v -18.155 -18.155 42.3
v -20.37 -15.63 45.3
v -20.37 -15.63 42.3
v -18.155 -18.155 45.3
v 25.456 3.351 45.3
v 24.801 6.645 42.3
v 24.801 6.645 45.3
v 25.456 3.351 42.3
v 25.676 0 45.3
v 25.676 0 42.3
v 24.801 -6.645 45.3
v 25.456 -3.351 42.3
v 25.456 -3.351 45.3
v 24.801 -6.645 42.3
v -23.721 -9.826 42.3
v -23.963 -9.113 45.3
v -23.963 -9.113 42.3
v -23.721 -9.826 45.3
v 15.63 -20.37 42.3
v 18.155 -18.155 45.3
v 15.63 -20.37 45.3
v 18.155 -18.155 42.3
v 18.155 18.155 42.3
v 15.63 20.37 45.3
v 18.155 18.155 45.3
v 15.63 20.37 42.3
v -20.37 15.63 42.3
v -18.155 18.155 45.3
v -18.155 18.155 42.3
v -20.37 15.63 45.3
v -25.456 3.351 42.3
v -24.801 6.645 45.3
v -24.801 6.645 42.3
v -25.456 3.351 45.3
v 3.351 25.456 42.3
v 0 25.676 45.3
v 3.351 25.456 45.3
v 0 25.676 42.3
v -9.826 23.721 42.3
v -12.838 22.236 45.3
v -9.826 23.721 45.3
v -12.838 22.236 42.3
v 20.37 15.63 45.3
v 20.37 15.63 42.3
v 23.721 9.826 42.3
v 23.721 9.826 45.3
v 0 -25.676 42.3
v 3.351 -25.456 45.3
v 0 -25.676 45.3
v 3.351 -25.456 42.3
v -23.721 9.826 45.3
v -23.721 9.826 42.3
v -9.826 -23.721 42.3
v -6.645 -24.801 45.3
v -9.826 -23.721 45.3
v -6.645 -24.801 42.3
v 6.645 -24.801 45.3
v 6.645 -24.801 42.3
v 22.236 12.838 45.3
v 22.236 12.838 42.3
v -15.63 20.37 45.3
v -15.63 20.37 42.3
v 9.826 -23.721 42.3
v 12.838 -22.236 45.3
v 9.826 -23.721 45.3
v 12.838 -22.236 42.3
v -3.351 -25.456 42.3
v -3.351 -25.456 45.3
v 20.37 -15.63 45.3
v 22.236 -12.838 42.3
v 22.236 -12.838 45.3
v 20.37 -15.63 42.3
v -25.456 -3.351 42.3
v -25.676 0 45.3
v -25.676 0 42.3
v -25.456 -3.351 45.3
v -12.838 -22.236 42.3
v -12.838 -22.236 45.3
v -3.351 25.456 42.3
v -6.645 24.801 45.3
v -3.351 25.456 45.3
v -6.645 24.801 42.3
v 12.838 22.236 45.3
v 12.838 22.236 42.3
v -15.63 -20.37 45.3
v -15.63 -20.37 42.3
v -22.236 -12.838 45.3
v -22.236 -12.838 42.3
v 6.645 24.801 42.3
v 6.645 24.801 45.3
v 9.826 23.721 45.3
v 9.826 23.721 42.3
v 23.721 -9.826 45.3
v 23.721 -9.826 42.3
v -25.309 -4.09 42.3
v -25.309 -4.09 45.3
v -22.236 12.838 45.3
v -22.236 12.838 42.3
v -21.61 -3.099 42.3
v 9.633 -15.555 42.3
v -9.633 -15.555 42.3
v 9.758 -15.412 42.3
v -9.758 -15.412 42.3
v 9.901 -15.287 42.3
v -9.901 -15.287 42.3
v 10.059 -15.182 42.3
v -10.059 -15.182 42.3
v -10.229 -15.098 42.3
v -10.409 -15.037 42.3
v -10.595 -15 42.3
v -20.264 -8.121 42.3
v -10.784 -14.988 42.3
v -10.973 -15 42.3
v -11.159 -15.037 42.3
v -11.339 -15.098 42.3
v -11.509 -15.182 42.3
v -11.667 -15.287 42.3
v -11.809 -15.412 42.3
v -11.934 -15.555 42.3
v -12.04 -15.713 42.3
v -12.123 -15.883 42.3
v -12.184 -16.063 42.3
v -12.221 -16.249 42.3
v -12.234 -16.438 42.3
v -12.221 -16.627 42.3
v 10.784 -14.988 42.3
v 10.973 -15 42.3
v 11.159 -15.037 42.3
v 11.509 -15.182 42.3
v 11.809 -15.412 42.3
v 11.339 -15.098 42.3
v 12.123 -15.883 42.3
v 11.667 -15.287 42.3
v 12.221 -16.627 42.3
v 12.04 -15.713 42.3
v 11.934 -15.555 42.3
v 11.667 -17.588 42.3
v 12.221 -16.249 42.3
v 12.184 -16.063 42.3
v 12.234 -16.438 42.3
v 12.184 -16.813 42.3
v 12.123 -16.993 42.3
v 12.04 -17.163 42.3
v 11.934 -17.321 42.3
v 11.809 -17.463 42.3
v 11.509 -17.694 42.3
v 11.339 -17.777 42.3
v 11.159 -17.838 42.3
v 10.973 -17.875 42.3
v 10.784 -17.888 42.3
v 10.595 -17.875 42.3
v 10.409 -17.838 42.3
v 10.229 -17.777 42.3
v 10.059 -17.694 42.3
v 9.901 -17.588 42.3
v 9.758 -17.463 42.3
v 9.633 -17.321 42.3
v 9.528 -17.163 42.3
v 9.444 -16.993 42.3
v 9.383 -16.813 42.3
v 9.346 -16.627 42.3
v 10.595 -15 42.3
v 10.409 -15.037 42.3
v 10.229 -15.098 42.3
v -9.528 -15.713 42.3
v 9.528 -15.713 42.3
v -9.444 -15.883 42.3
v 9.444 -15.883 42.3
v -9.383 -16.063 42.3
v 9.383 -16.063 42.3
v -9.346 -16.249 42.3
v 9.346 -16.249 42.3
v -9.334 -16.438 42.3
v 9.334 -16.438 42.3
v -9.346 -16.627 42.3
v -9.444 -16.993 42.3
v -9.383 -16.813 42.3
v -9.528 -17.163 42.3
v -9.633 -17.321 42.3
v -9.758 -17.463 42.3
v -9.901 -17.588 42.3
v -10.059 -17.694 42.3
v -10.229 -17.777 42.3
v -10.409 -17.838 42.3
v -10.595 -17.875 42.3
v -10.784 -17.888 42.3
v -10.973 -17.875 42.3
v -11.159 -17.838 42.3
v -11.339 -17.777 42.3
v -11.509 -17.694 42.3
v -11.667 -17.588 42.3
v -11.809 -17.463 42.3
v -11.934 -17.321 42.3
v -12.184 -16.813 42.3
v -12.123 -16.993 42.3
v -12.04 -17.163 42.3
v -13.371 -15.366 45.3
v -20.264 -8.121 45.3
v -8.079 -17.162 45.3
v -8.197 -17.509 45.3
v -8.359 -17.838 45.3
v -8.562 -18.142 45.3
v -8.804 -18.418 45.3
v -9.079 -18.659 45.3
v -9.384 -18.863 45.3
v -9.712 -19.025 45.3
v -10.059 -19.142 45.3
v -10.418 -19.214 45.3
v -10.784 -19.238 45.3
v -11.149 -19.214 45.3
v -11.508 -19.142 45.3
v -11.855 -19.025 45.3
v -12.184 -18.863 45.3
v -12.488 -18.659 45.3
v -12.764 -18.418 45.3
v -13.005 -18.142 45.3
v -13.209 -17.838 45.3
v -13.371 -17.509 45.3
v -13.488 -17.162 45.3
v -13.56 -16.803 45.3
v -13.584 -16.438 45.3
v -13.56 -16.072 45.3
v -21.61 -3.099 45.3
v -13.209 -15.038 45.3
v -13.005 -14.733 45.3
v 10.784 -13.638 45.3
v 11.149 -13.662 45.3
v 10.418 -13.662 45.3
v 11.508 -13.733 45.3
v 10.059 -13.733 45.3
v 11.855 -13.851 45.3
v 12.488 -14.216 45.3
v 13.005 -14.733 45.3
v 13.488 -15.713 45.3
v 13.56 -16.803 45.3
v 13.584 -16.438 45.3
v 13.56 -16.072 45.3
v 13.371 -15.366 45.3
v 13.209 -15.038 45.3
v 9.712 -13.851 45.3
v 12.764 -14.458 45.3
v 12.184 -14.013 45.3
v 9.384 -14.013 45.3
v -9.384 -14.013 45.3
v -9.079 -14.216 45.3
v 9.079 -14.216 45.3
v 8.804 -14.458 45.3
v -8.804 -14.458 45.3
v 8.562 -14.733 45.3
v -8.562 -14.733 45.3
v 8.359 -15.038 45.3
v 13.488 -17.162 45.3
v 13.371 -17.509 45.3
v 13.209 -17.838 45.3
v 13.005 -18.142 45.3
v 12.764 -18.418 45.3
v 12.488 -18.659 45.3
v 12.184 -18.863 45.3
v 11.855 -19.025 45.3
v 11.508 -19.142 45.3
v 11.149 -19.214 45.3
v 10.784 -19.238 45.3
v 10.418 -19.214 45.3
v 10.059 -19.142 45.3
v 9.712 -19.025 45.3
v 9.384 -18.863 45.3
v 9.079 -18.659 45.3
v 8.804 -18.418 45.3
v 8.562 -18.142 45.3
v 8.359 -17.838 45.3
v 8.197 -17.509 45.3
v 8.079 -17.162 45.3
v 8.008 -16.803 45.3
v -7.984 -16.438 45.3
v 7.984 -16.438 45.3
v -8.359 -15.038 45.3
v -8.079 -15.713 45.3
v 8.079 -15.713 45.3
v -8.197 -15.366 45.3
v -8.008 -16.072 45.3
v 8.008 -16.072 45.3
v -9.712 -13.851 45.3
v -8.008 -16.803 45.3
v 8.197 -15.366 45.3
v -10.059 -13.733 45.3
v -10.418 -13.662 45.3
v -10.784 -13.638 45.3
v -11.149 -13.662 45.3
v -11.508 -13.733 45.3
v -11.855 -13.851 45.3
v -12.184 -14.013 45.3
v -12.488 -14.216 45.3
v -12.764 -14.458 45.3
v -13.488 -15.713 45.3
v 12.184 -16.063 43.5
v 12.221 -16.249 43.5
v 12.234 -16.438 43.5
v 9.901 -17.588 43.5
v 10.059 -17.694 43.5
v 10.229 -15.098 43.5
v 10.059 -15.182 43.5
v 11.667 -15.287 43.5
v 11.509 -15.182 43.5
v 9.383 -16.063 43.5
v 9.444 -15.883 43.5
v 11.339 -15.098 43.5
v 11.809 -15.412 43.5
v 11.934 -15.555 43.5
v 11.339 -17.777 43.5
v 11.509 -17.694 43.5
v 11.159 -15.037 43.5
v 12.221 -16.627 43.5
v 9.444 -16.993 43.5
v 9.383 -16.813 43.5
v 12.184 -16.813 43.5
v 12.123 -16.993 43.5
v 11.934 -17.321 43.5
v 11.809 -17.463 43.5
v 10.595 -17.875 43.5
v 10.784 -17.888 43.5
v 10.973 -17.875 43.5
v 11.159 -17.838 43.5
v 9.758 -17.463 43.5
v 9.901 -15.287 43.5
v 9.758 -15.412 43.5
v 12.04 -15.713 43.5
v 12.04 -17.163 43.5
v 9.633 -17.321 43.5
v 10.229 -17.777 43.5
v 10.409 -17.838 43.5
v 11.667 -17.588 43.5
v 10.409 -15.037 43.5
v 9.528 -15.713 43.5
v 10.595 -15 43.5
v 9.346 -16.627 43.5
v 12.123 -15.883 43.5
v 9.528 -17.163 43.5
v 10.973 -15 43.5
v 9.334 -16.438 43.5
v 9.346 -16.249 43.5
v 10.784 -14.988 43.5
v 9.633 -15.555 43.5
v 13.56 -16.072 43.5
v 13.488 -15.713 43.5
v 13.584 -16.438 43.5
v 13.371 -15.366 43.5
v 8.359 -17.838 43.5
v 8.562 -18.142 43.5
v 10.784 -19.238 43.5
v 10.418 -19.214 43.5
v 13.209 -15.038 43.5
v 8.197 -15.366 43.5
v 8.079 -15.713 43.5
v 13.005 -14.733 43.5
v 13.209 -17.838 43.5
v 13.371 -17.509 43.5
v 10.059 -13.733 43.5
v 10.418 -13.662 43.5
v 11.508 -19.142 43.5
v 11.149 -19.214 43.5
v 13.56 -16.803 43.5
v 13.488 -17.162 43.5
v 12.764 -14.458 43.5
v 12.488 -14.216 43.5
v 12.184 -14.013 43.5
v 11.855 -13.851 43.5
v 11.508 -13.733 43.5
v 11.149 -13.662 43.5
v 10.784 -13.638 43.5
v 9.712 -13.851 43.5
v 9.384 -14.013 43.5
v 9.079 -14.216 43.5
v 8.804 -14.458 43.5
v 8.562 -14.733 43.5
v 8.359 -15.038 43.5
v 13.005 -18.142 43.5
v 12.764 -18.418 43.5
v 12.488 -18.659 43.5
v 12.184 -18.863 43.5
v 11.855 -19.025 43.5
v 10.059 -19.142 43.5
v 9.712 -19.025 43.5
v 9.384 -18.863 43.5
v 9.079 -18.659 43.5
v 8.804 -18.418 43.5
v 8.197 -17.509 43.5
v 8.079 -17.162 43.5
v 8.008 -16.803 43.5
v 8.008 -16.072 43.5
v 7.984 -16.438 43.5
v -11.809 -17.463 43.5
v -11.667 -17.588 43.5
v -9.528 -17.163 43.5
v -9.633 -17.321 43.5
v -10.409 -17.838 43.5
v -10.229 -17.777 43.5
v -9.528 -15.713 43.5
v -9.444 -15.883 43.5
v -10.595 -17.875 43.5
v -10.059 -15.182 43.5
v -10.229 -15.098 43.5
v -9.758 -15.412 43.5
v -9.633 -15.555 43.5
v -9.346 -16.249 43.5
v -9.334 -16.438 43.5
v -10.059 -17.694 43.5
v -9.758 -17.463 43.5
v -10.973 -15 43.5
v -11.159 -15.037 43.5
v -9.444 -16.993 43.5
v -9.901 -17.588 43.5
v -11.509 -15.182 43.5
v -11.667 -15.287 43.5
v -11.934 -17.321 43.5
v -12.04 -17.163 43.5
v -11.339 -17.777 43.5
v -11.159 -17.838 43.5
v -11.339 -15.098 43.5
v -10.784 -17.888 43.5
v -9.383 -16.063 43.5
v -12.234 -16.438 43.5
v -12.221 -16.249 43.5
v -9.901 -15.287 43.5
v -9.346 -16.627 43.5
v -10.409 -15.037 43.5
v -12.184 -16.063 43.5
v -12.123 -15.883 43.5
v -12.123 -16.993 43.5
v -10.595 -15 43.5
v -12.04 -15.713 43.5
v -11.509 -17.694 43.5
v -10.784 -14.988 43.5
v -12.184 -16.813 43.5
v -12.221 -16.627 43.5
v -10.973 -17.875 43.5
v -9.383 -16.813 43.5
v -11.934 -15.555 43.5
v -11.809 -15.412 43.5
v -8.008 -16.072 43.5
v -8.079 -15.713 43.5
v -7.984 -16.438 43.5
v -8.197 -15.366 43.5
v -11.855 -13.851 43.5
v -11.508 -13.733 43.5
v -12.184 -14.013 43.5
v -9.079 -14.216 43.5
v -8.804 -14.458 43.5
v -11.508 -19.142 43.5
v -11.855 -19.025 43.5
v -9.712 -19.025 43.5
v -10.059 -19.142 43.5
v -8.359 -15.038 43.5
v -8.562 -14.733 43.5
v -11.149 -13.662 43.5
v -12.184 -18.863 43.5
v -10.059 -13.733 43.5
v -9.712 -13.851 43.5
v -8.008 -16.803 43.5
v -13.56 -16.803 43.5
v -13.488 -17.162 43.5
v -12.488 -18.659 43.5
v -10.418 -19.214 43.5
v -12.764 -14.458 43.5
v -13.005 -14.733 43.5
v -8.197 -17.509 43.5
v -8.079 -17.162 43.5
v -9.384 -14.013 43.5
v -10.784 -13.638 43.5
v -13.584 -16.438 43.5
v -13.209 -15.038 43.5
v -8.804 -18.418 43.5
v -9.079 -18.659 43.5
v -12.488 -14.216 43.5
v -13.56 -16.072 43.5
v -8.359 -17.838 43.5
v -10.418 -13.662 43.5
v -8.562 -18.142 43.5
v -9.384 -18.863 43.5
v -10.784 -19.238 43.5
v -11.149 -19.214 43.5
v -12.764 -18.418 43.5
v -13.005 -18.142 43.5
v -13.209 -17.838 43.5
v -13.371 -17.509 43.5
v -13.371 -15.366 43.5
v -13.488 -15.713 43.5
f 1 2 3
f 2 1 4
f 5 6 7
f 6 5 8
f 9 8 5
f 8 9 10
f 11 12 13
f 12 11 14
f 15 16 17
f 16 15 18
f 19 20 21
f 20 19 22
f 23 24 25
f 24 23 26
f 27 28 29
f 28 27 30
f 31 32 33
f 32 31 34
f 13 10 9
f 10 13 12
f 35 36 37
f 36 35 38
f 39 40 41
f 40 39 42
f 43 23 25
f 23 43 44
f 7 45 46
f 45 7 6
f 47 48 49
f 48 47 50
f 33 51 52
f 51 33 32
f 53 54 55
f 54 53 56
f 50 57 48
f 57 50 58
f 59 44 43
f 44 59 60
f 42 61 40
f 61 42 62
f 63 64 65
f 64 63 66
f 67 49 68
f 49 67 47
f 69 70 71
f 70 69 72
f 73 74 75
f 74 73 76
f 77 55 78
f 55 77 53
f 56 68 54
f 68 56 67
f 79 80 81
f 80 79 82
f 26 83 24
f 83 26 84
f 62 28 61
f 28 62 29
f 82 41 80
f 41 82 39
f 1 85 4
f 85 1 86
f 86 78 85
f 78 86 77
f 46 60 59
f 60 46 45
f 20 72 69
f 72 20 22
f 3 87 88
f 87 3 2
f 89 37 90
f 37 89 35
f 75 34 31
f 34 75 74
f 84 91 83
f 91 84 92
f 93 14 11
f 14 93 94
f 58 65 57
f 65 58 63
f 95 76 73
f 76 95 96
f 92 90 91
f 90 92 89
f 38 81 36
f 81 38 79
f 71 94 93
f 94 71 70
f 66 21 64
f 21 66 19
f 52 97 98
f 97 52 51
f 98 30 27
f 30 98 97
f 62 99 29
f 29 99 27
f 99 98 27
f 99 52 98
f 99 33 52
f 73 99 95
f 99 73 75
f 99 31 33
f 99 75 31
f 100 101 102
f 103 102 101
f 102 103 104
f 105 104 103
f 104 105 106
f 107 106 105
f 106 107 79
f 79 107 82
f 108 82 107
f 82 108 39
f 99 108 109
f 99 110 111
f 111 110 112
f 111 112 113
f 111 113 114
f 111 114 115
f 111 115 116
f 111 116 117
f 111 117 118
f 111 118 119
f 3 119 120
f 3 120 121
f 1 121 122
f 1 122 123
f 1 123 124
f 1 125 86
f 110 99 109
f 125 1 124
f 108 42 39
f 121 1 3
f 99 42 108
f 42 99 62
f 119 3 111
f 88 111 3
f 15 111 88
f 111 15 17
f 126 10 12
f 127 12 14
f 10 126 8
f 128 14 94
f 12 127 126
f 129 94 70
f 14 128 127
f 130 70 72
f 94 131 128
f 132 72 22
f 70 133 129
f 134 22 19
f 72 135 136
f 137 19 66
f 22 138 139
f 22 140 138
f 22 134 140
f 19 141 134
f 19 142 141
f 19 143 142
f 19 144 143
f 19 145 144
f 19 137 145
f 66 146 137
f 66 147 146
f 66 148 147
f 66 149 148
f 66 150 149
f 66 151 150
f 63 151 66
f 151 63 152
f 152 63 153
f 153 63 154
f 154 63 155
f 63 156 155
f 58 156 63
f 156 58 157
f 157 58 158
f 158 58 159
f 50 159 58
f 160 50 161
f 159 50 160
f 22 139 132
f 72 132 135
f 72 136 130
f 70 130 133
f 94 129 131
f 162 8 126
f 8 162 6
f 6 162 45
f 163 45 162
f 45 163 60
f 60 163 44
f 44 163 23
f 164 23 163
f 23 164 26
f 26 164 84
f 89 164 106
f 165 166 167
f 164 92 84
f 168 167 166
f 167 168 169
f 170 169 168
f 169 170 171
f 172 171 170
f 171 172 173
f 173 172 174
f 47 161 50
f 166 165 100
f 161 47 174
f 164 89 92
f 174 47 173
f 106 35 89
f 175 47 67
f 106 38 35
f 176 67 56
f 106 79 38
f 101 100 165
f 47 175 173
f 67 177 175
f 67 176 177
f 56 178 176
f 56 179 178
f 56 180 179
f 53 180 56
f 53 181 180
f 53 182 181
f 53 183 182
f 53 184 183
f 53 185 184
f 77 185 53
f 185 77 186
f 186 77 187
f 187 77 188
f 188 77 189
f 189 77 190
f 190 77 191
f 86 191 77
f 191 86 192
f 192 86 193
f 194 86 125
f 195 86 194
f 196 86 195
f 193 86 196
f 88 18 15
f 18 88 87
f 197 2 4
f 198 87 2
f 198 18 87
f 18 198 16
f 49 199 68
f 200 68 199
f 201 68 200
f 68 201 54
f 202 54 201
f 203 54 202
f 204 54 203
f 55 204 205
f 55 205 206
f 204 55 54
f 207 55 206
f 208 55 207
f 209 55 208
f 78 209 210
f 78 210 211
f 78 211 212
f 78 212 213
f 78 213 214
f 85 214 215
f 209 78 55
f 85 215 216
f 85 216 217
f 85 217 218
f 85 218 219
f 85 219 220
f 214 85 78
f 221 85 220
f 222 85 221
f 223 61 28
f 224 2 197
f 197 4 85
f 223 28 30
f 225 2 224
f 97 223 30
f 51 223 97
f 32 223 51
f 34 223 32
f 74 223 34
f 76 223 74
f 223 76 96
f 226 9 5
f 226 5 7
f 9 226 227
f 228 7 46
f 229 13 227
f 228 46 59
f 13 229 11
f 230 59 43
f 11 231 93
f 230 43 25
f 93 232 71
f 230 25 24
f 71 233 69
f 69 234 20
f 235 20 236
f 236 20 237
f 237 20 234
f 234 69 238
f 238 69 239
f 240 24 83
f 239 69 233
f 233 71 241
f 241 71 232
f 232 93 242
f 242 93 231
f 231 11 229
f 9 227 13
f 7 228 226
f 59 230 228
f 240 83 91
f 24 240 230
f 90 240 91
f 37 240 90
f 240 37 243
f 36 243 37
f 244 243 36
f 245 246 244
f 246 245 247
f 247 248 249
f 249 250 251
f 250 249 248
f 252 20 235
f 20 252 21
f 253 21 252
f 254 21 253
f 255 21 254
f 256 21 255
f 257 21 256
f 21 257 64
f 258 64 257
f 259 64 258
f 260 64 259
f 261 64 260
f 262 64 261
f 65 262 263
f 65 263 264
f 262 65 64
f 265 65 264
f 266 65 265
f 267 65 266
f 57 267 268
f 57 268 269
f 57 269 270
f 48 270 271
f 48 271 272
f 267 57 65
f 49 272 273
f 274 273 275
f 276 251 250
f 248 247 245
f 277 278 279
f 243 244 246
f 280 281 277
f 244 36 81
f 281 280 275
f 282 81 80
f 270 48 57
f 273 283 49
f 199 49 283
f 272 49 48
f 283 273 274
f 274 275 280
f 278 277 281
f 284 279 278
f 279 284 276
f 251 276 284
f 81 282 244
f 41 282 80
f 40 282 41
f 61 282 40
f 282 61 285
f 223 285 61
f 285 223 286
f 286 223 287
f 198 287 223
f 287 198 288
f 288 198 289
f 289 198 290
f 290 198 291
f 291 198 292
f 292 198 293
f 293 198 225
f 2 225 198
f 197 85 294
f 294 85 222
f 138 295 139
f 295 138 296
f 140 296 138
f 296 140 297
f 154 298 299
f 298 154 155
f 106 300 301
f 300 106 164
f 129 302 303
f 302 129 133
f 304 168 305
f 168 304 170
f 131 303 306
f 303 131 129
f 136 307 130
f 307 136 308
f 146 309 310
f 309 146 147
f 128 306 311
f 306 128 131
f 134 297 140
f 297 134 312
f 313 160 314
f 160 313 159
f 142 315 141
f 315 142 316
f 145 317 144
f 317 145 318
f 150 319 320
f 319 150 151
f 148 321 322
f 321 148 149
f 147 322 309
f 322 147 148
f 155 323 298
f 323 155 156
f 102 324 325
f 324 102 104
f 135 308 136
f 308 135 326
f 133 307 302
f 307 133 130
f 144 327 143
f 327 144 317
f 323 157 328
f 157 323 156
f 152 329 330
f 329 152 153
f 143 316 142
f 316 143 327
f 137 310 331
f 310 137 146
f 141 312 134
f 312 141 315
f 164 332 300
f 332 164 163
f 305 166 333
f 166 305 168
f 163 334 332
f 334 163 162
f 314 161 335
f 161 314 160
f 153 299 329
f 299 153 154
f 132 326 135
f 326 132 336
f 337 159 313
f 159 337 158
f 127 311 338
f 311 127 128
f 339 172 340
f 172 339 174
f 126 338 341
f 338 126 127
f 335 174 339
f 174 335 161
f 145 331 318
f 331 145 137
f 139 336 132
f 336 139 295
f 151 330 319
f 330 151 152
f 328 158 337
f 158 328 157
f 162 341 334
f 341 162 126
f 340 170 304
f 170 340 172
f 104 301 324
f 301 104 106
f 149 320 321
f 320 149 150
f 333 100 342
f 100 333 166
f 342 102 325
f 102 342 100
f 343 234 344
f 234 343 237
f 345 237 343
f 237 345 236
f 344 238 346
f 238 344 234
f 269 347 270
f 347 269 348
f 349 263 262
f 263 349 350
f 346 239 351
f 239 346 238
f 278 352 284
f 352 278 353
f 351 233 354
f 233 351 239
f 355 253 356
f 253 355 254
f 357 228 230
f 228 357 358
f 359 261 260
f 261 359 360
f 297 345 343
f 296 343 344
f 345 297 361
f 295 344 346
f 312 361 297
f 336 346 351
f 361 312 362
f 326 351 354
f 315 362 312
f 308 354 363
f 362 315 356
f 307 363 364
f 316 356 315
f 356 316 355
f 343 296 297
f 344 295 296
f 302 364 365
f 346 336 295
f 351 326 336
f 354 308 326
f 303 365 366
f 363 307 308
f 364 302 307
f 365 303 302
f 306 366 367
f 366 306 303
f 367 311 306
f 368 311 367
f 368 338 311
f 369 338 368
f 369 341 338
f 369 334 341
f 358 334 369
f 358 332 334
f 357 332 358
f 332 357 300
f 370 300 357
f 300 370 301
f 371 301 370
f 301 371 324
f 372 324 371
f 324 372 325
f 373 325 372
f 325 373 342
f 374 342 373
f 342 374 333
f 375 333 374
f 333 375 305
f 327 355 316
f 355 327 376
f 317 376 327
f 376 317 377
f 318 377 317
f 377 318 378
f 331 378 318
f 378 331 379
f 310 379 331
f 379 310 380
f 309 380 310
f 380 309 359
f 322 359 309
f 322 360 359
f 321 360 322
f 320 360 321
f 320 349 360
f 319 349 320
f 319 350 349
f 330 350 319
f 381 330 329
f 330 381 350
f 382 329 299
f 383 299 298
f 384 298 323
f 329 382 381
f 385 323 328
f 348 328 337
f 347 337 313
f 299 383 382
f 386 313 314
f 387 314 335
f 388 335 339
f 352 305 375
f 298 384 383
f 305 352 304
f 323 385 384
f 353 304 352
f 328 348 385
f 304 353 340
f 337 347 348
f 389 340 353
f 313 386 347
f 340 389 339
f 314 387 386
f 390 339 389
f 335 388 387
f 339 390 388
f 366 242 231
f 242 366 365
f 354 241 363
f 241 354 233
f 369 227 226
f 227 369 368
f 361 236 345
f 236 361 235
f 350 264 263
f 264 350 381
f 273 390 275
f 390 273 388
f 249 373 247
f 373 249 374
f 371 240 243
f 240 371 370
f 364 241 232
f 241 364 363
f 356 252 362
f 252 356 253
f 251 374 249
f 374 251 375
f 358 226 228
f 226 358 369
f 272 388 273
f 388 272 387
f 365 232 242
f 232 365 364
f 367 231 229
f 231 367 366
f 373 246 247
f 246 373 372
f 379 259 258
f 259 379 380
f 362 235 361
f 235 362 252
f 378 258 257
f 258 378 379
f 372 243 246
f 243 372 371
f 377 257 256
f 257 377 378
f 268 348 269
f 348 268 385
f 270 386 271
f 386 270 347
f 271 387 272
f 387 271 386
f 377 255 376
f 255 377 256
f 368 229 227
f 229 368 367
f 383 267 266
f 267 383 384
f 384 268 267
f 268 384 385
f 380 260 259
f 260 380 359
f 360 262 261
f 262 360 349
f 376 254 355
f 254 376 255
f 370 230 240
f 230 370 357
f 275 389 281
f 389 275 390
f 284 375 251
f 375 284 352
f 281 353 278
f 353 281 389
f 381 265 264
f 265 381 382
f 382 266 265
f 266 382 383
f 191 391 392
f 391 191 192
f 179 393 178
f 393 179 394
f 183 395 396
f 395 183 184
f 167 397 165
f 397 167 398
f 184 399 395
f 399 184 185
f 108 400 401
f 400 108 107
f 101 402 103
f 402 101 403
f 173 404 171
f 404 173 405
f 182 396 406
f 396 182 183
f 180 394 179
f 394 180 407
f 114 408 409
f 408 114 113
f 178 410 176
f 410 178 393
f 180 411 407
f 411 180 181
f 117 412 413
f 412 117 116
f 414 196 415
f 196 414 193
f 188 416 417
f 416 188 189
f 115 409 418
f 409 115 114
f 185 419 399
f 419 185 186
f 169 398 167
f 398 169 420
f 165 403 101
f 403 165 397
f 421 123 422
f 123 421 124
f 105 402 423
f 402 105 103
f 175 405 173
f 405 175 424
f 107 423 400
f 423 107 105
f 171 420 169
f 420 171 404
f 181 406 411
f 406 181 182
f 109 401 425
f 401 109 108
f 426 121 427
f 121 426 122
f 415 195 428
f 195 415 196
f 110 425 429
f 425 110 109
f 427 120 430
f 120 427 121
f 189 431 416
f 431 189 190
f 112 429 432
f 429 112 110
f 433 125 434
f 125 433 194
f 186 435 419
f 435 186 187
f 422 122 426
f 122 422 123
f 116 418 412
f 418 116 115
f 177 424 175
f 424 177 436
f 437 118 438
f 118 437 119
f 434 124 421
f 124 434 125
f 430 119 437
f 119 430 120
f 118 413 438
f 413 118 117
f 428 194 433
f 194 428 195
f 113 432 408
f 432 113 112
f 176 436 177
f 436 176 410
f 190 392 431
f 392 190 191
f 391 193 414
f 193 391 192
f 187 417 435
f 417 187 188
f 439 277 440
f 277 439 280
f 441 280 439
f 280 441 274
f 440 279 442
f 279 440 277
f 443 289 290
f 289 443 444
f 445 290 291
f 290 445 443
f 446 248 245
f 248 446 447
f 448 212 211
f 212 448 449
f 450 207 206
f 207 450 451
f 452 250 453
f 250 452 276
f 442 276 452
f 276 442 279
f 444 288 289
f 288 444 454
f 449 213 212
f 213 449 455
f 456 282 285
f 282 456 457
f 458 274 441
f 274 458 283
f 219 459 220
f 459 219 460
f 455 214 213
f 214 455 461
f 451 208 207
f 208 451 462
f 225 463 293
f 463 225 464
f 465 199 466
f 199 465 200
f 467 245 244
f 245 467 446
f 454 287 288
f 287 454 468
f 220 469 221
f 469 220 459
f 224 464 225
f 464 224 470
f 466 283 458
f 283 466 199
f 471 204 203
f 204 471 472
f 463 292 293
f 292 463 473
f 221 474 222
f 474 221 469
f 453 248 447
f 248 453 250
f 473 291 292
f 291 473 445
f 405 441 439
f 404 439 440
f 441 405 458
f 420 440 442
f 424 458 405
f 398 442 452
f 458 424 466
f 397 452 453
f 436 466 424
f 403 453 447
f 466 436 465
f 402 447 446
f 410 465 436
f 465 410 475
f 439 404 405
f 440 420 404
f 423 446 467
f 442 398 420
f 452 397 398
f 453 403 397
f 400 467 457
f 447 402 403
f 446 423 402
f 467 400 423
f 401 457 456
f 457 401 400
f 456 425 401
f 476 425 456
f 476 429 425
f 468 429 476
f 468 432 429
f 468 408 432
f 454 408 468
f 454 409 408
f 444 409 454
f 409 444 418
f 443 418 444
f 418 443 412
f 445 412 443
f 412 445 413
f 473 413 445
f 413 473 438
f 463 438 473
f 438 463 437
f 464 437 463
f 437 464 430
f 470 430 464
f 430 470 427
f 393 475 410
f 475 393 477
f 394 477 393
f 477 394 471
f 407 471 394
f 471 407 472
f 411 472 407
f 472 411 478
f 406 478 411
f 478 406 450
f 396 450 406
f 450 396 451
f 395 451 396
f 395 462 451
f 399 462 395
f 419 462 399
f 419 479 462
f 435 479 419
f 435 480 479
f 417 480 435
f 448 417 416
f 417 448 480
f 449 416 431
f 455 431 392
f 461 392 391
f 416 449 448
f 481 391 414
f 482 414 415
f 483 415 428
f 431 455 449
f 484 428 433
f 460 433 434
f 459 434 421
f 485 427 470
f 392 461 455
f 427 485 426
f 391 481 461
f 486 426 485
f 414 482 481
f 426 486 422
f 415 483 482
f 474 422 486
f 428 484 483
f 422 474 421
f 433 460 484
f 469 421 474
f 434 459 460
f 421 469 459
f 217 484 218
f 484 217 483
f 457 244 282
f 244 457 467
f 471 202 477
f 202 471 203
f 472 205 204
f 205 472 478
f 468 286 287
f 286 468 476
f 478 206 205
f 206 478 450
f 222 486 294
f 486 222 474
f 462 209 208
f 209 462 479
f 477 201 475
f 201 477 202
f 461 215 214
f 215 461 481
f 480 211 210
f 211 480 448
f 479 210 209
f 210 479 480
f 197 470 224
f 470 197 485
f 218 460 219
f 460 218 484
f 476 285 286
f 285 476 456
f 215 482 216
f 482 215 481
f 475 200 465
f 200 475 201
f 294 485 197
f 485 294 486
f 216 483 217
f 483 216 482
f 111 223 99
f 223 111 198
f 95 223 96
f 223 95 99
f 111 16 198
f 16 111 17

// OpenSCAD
// left cartridge_cap_elbow: press F6 (render) then File > Export > STL
include <../lib/g1_servo_arm.scad>
side = "left";
part = "cartridge_cap_elbow";
